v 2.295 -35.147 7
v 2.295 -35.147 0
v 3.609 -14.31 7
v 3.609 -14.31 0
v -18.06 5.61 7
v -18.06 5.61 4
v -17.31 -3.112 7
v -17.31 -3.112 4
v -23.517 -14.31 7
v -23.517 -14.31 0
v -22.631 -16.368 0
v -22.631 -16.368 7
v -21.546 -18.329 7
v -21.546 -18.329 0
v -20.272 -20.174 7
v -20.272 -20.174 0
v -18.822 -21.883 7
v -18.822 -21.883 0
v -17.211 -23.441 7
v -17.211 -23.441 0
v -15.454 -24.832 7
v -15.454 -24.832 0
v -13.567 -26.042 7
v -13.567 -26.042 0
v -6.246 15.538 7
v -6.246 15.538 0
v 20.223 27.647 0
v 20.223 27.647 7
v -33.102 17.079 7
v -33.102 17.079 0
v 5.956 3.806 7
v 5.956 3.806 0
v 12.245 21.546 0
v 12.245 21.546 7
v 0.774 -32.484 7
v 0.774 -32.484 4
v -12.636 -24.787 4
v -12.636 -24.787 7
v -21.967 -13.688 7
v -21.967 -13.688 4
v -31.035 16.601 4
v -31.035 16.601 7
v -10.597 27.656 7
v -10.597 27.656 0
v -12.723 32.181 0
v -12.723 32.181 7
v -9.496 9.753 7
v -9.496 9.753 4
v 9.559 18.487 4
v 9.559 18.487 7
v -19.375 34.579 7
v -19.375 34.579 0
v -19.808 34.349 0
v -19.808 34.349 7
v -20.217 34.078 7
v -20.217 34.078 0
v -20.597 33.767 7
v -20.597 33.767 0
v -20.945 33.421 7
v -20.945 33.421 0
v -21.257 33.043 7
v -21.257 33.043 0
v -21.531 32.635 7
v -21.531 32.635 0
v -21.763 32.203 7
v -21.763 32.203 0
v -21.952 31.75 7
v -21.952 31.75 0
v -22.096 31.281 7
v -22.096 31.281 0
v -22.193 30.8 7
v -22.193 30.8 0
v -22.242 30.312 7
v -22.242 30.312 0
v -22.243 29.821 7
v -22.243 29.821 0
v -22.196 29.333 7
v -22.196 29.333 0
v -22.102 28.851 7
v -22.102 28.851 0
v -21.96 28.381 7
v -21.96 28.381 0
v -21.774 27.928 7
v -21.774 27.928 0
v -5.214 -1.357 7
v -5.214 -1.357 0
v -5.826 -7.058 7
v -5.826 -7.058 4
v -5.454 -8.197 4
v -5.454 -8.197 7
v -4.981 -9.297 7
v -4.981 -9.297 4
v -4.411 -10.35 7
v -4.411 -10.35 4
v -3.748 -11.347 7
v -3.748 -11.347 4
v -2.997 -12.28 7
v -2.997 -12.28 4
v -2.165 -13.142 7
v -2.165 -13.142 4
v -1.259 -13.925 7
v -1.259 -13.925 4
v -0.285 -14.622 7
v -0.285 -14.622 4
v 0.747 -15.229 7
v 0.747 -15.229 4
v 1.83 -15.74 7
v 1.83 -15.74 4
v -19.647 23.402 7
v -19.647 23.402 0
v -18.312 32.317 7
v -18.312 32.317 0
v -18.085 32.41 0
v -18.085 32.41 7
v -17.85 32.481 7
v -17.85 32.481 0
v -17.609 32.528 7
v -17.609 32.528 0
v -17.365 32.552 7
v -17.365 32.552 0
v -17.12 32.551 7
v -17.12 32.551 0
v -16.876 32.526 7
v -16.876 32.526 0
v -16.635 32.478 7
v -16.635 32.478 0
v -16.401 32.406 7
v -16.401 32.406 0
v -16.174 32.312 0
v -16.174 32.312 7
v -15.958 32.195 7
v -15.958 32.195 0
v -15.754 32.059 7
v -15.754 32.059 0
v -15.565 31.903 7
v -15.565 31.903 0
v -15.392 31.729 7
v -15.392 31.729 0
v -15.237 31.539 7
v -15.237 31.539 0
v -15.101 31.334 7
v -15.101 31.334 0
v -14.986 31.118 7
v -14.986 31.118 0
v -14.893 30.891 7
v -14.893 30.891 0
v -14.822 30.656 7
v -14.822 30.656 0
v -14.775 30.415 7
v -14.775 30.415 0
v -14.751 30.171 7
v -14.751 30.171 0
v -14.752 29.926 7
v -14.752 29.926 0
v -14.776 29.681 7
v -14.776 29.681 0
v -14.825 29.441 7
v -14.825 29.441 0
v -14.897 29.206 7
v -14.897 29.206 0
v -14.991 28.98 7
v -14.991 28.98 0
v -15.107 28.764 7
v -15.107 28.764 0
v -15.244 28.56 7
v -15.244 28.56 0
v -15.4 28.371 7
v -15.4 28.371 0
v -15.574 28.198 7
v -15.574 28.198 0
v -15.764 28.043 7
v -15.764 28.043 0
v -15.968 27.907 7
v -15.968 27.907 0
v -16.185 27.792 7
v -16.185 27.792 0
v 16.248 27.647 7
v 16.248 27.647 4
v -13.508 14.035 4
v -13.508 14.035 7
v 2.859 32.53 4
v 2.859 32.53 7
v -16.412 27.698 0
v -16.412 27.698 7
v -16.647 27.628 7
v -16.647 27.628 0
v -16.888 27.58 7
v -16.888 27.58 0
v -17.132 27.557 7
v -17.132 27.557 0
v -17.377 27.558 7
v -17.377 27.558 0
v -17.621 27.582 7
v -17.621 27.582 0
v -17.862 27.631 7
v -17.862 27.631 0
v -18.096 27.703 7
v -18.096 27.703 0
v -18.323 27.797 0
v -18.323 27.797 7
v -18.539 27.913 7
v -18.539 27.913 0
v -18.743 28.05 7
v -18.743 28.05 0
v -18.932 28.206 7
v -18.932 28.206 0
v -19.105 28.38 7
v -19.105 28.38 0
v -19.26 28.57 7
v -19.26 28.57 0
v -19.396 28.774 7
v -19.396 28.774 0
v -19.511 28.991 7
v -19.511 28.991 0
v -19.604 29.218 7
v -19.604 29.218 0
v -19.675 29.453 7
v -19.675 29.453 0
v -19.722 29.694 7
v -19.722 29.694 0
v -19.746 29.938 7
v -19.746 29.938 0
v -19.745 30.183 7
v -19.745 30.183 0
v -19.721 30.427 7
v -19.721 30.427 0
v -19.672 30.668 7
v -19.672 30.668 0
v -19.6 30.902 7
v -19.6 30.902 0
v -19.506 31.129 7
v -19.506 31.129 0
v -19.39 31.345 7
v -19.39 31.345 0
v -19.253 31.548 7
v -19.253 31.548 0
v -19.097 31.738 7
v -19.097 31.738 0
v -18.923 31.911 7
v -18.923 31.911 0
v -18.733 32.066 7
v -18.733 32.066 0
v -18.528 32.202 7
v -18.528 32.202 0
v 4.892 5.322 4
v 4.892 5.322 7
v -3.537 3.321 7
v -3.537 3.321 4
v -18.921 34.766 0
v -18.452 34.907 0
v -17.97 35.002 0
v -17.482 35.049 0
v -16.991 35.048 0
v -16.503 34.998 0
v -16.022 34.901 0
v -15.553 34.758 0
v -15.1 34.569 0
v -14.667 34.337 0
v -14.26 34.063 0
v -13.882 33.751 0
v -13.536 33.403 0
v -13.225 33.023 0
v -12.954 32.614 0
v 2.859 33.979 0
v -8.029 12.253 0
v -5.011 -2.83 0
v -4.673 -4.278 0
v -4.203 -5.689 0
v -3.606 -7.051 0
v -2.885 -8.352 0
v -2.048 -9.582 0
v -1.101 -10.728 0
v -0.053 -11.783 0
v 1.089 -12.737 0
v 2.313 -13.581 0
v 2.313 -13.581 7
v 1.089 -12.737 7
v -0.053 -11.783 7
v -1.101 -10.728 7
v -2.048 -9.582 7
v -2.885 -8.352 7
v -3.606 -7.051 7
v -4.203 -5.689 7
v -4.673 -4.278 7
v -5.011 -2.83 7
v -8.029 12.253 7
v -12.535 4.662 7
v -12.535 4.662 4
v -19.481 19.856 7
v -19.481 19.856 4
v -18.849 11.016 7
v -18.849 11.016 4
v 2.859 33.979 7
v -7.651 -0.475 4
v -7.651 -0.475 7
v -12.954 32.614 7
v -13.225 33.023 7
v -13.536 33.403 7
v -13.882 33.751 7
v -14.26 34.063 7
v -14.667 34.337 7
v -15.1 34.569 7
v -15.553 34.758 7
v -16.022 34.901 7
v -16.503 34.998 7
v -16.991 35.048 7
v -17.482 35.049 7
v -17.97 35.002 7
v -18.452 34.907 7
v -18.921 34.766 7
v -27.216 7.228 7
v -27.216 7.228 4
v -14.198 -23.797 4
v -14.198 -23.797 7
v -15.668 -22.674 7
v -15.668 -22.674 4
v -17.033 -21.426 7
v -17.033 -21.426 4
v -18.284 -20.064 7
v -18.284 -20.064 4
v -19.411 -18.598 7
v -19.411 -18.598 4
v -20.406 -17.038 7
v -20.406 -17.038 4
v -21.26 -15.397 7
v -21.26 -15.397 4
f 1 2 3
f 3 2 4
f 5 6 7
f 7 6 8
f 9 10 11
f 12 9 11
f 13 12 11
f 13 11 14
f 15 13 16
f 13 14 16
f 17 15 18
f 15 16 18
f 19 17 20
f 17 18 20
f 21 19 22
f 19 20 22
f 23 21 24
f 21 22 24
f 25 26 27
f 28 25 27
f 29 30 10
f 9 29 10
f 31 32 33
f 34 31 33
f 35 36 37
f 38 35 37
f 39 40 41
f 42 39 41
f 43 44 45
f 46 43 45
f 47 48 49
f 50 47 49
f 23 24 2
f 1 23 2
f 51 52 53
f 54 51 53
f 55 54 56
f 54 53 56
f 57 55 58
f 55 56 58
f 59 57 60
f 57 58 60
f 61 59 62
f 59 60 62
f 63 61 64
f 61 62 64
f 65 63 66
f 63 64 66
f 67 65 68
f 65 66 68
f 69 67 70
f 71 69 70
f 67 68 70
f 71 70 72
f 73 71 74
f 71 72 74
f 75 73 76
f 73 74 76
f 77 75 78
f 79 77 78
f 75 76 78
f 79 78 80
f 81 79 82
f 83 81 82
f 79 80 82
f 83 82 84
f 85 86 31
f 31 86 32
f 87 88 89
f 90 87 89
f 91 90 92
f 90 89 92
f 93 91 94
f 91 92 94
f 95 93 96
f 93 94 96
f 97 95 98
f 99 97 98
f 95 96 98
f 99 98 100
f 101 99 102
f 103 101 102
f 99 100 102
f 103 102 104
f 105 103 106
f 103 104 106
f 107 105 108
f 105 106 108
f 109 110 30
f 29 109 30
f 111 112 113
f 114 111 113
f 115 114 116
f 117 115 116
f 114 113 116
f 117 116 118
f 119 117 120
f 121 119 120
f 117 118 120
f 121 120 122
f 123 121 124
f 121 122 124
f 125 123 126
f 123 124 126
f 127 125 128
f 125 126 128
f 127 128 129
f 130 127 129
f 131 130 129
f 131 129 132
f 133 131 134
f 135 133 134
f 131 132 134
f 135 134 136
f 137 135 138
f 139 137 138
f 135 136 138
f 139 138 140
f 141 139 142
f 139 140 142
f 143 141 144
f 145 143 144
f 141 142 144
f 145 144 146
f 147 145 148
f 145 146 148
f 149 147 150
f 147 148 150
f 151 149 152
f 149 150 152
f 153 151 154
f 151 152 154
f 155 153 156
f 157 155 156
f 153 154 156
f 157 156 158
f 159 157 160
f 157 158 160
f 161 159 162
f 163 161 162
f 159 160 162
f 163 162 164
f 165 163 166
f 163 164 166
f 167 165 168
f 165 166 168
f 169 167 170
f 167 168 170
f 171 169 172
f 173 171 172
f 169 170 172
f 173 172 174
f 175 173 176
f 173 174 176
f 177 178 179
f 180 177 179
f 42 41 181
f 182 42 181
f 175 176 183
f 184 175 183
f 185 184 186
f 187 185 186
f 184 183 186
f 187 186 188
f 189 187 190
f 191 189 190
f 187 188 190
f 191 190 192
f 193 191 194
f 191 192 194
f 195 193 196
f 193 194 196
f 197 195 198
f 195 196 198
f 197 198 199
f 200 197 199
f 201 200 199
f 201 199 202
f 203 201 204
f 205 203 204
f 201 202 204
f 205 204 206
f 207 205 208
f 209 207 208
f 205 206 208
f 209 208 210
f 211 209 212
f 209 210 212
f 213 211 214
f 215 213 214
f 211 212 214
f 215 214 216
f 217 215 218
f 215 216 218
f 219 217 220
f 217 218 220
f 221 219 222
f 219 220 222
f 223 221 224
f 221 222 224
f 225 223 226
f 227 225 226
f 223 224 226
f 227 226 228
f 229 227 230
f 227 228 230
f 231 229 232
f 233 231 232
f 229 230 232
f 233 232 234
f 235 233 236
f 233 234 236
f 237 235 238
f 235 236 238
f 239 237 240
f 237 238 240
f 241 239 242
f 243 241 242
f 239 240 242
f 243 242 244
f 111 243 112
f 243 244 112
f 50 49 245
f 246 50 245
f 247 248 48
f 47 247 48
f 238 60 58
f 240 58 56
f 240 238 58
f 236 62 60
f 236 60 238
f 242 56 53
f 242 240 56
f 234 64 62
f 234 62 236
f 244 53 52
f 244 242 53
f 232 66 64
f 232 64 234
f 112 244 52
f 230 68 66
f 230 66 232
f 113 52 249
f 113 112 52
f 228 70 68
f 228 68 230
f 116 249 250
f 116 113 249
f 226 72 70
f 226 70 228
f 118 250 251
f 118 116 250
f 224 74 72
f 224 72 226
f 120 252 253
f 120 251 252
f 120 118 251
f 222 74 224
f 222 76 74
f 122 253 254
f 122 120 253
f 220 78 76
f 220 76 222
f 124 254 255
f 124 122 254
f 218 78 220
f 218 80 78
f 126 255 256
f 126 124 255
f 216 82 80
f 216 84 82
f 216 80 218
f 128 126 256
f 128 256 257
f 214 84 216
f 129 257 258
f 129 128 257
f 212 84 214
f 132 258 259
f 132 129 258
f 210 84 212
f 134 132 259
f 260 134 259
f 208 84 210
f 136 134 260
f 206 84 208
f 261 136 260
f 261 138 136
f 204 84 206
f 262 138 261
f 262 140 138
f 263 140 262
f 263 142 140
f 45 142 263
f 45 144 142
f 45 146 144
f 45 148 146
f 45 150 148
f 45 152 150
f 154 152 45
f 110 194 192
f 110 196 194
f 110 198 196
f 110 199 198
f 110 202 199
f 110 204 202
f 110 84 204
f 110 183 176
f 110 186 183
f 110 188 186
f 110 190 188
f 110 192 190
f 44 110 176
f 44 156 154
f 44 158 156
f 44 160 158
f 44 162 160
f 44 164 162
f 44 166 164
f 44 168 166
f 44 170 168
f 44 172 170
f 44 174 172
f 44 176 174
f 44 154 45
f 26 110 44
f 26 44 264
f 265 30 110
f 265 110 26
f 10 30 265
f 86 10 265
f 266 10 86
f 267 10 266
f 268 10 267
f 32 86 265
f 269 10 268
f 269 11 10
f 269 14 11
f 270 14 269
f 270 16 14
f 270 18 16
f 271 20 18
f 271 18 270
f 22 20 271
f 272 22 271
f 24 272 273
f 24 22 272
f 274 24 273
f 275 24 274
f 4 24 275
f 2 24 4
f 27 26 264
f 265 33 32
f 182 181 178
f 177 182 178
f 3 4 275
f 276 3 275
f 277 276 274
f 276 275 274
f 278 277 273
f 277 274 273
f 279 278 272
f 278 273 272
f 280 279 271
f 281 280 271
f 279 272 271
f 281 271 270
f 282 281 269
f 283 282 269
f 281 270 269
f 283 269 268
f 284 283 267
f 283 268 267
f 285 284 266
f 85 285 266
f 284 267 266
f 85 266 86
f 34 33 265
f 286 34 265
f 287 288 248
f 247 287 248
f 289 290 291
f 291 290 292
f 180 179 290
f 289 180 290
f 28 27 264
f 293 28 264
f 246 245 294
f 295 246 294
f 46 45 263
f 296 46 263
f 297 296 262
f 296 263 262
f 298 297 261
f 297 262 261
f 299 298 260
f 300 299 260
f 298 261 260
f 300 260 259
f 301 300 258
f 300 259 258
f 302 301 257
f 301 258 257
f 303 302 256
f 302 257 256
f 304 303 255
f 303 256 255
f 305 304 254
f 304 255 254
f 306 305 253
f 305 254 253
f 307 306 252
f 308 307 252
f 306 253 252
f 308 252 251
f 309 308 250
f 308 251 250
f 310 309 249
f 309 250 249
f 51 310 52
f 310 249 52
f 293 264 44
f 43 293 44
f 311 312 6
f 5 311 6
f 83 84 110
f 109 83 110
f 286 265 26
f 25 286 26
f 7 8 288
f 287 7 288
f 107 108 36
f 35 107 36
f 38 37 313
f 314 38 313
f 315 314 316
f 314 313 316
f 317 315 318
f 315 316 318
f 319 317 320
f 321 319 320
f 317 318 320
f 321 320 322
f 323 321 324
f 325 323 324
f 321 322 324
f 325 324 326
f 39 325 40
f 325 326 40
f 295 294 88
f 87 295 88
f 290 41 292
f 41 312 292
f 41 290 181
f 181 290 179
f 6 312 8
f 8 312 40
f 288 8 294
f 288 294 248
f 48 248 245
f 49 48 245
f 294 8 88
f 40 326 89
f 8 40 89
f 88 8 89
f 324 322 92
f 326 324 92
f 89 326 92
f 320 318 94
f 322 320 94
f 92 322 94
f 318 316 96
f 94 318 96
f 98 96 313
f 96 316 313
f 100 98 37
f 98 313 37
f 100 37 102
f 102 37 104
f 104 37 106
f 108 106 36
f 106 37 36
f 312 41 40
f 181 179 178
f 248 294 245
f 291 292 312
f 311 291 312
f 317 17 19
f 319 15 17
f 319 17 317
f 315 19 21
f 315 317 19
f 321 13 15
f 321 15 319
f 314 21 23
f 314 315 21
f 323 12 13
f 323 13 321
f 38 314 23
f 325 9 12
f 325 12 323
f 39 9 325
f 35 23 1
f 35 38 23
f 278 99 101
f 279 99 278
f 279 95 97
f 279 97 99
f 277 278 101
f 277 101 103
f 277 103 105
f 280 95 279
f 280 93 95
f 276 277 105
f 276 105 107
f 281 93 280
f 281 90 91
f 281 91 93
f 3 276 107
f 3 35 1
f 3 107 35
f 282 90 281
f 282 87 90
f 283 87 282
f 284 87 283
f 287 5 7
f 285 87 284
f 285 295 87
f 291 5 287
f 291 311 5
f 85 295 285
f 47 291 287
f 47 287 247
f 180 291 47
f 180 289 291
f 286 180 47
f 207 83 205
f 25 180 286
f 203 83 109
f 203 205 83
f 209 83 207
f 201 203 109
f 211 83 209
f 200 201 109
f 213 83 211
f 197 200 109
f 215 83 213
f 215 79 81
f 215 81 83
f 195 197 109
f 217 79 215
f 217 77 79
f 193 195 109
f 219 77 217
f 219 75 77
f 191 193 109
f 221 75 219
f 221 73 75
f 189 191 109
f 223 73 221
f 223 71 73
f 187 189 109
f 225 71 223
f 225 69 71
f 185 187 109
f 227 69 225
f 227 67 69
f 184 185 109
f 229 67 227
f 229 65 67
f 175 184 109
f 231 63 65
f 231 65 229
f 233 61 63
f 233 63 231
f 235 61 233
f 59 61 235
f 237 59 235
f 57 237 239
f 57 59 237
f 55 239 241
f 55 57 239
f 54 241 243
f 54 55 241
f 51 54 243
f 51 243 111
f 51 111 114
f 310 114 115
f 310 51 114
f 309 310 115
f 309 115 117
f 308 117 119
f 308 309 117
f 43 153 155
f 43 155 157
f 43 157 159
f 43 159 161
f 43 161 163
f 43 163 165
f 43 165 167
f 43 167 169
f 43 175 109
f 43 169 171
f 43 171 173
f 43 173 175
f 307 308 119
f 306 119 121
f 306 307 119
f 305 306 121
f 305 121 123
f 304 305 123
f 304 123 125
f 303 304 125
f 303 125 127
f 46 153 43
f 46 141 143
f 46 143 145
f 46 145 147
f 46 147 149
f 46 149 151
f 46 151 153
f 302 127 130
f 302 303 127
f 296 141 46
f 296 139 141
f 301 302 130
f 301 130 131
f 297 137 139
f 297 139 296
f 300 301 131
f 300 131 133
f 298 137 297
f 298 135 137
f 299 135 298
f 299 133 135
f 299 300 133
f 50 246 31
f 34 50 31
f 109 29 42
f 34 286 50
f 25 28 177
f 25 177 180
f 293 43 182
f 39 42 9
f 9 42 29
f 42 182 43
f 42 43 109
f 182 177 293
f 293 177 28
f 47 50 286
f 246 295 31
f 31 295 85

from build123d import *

# Parameters (mm, degrees)
F1_DEPTH = 7
F3_DEPTH = 4


# Not quite as in the source:
# - a feature names something its author has since deleted; it is built from what else it names


with BuildPart() as f1:
    # F0 (on Top) → F1 (new body)
    with BuildSketch(Plane.XY):
        with BuildLine():
            Line((-19.6469386943, 23.4024446265), (-33.1021886284, 17.0788295944))
            Line((-33.1021886284, 17.0788295944), (-23.5166549683, -14.3096297979))
            ThreePointArc((-23.5166549683, -14.3096297979), (-19.5683456994, -21.0463448921), (-13.5673098266, -26.0423477739))
            Line((-13.5673098266, -26.0423477739), (2.2953252774, -35.1469367743))
            Line((2.2953252774, -35.1469367743), (3.609388601, -14.3096297979))
            ThreePointArc((3.609388601, -14.3096297979), (-2.48073947, -8.9765820448), (-5.2136145532, -1.3567098649))
            Line((-5.2136145532, -1.3567098649), (5.9560768355, 3.8057526561))
            Line((5.9560768355, 3.8057526561), (12.2448138941, 21.5456220774))
            Line((12.2448138941, 21.5456220774), (-8.0293232526, 12.2533091797))
            Line((-8.0293232526, 12.2533091797), (-6.2459499526, 15.5384703992))
            Line((-6.2459499526, 15.5384703992), (20.2230613727, 27.64663617))
            Line((20.2230613727, 27.64663617), (2.8586395134, 33.9794768895))
            Line((2.8586395134, 33.9794768895), (-10.5966104207, 27.6558618574))
            Line((-10.5966104207, 27.6558618574), (-15.1217745575, 25.529153242))
            Line((-15.1217745575, 25.529153242), (-19.6469386943, 23.4024446265))
        make_face()
        with BuildLine():
            Line((-21.966829896, -13.6883575469), (-31.0345193002, 16.6006959636))
            Line((-31.0345193002, 16.6006959636), (2.8586395134, 32.5295928335))
            Line((2.8586395134, 32.5295928335), (16.2475313521, 27.64663617))
            Line((16.2475313521, 27.64663617), (-13.5077397905, 14.0351812079))
            Line((-13.5077397905, 14.0351812079), (-19.4805990905, 19.85604316))
            Line((-19.4805990905, 19.85604316), (-18.8491754234, 11.0161071643))
            Line((-18.8491754234, 11.0161071643), (-27.2155441344, 7.2275632992))
            Line((-27.2155441344, 7.2275632992), (-18.0598944426, 5.6095388718))
            Line((-18.0598944426, 5.6095388718), (-17.3100791872, -3.1120055355))
            Line((-17.3100791872, -3.1120055355), (-12.5349350274, 4.6624024399))
            Line((-12.5349350274, 4.6624024399), (-3.5371426493, 3.3206269145))
            Line((-3.5371426493, 3.3206269145), (-9.4962064177, 9.7532588989))
            Line((-9.4962064177, 9.7532588989), (9.5593021267, 18.4870336848))
            Line((9.5593021267, 18.4870336848), (4.8924595123, 5.3223588356))
            Line((4.8924595123, 5.3223588356), (-7.6506364332, -0.4748705114))
            Line((-7.6506364332, -0.4748705114), (-5.8260546066, -7.0584053174))
            ThreePointArc((-5.8260546066, -7.0584053174), (-2.996906843, -12.2802585435), (1.8299611984, -15.7404858619))
            Line((1.8299611984, -15.7404858619), (0.7740783702, -32.4837844721))
            Line((0.7740783702, -32.4837844721), (-12.6359384992, -24.7869112046))
            ThreePointArc((-12.6359384992, -24.7869112046), (-18.2844119376, -20.0640956756), (-21.966829896, -13.6883575469))
        make_face(mode=Mode.SUBTRACT)
        with BuildLine():
            Line((-21.7736473098, 27.9276087633), (-19.6469386943, 23.4024446265))
            Line((-19.6469386943, 23.4024446265), (-15.1217745575, 25.529153242))
            Line((-15.1217745575, 25.529153242), (-10.5966104207, 27.6558618574))
            Line((-10.5966104207, 27.6558618574), (-12.7233190362, 32.1810259942))
            ThreePointArc((-12.7233190362, 32.1810259942), (-15.5525190095, 34.7579017095), (-19.3751917885, 34.5794815155))
            ThreePointArc((-19.3751917885, 34.5794815155), (-21.9520675037, 31.7502815423), (-21.7736473098, 27.9276087633))
        make_face()
        with BuildLine():
            ThreePointArc((-18.3118374807, 32.3168994471), (-14.9859011046, 31.1176716865), (-16.1851288653, 27.7917353104))
            ThreePointArc((-16.1851288653, 27.7917353104), (-19.5110652414, 28.990963071), (-18.3118374807, 32.3168994471))
        make_face(mode=Mode.SUBTRACT)
    extrude(amount=F1_DEPTH)

    # F2 (on face) → F3 (join)
    with BuildSketch(Plane(origin=(0, 0, 0), x_dir=(1, 0, 0), z_dir=(0, 0, -1))):
        with BuildLine():
            ThreePointArc((-12.6359384992, 24.7869112046), (-18.2844119376, 20.0640956756), (-21.966829896, 13.6883575469))
            Line((-21.966829896, 13.6883575469), (-31.0345193002, -16.6006959636))
            Line((-31.0345193002, -16.6006959636), (2.8586395134, -32.5295928335))
            Line((2.8586395134, -32.5295928335), (16.2475313521, -27.64663617))
            Line((16.2475313521, -27.64663617), (-13.5077397905, -14.0351812079))
            Line((-13.5077397905, -14.0351812079), (-19.4805990905, -19.85604316))
            Line((-19.4805990905, -19.85604316), (-18.8491754234, -11.0161071643))
            Line((-18.8491754234, -11.0161071643), (-27.2155441344, -7.2275632992))
            Line((-27.2155441344, -7.2275632992), (-18.0598944426, -5.6095388718))
            Line((-18.0598944426, -5.6095388718), (-17.3100791872, 3.1120055355))
            Line((-17.3100791872, 3.1120055355), (-12.5349350274, -4.6624024399))
            Line((-12.5349350274, -4.6624024399), (-3.5371426493, -3.3206269145))
            Line((-3.5371426493, -3.3206269145), (-9.4962064177, -9.7532588989))
            Line((-9.4962064177, -9.7532588989), (9.5593021267, -18.4870336848))
            Line((9.5593021267, -18.4870336848), (4.8924595123, -5.3223588356))
            Line((4.8924595123, -5.3223588356), (-7.6506364332, 0.4748705114))
            Line((-7.6506364332, 0.4748705114), (-5.8260546066, 7.0584053174))
            ThreePointArc((-5.8260546066, 7.0584053174), (-2.996906843, 12.2802585435), (1.8299611984, 15.7404858619))
            Line((1.8299611984, 15.7404858619), (0.7740783702, 32.4837844721))
            Line((0.7740783702, 32.4837844721), (-12.6359384992, 24.7869112046))
        make_face()
    extrude(amount=-F3_DEPTH)


solid = f1.part
